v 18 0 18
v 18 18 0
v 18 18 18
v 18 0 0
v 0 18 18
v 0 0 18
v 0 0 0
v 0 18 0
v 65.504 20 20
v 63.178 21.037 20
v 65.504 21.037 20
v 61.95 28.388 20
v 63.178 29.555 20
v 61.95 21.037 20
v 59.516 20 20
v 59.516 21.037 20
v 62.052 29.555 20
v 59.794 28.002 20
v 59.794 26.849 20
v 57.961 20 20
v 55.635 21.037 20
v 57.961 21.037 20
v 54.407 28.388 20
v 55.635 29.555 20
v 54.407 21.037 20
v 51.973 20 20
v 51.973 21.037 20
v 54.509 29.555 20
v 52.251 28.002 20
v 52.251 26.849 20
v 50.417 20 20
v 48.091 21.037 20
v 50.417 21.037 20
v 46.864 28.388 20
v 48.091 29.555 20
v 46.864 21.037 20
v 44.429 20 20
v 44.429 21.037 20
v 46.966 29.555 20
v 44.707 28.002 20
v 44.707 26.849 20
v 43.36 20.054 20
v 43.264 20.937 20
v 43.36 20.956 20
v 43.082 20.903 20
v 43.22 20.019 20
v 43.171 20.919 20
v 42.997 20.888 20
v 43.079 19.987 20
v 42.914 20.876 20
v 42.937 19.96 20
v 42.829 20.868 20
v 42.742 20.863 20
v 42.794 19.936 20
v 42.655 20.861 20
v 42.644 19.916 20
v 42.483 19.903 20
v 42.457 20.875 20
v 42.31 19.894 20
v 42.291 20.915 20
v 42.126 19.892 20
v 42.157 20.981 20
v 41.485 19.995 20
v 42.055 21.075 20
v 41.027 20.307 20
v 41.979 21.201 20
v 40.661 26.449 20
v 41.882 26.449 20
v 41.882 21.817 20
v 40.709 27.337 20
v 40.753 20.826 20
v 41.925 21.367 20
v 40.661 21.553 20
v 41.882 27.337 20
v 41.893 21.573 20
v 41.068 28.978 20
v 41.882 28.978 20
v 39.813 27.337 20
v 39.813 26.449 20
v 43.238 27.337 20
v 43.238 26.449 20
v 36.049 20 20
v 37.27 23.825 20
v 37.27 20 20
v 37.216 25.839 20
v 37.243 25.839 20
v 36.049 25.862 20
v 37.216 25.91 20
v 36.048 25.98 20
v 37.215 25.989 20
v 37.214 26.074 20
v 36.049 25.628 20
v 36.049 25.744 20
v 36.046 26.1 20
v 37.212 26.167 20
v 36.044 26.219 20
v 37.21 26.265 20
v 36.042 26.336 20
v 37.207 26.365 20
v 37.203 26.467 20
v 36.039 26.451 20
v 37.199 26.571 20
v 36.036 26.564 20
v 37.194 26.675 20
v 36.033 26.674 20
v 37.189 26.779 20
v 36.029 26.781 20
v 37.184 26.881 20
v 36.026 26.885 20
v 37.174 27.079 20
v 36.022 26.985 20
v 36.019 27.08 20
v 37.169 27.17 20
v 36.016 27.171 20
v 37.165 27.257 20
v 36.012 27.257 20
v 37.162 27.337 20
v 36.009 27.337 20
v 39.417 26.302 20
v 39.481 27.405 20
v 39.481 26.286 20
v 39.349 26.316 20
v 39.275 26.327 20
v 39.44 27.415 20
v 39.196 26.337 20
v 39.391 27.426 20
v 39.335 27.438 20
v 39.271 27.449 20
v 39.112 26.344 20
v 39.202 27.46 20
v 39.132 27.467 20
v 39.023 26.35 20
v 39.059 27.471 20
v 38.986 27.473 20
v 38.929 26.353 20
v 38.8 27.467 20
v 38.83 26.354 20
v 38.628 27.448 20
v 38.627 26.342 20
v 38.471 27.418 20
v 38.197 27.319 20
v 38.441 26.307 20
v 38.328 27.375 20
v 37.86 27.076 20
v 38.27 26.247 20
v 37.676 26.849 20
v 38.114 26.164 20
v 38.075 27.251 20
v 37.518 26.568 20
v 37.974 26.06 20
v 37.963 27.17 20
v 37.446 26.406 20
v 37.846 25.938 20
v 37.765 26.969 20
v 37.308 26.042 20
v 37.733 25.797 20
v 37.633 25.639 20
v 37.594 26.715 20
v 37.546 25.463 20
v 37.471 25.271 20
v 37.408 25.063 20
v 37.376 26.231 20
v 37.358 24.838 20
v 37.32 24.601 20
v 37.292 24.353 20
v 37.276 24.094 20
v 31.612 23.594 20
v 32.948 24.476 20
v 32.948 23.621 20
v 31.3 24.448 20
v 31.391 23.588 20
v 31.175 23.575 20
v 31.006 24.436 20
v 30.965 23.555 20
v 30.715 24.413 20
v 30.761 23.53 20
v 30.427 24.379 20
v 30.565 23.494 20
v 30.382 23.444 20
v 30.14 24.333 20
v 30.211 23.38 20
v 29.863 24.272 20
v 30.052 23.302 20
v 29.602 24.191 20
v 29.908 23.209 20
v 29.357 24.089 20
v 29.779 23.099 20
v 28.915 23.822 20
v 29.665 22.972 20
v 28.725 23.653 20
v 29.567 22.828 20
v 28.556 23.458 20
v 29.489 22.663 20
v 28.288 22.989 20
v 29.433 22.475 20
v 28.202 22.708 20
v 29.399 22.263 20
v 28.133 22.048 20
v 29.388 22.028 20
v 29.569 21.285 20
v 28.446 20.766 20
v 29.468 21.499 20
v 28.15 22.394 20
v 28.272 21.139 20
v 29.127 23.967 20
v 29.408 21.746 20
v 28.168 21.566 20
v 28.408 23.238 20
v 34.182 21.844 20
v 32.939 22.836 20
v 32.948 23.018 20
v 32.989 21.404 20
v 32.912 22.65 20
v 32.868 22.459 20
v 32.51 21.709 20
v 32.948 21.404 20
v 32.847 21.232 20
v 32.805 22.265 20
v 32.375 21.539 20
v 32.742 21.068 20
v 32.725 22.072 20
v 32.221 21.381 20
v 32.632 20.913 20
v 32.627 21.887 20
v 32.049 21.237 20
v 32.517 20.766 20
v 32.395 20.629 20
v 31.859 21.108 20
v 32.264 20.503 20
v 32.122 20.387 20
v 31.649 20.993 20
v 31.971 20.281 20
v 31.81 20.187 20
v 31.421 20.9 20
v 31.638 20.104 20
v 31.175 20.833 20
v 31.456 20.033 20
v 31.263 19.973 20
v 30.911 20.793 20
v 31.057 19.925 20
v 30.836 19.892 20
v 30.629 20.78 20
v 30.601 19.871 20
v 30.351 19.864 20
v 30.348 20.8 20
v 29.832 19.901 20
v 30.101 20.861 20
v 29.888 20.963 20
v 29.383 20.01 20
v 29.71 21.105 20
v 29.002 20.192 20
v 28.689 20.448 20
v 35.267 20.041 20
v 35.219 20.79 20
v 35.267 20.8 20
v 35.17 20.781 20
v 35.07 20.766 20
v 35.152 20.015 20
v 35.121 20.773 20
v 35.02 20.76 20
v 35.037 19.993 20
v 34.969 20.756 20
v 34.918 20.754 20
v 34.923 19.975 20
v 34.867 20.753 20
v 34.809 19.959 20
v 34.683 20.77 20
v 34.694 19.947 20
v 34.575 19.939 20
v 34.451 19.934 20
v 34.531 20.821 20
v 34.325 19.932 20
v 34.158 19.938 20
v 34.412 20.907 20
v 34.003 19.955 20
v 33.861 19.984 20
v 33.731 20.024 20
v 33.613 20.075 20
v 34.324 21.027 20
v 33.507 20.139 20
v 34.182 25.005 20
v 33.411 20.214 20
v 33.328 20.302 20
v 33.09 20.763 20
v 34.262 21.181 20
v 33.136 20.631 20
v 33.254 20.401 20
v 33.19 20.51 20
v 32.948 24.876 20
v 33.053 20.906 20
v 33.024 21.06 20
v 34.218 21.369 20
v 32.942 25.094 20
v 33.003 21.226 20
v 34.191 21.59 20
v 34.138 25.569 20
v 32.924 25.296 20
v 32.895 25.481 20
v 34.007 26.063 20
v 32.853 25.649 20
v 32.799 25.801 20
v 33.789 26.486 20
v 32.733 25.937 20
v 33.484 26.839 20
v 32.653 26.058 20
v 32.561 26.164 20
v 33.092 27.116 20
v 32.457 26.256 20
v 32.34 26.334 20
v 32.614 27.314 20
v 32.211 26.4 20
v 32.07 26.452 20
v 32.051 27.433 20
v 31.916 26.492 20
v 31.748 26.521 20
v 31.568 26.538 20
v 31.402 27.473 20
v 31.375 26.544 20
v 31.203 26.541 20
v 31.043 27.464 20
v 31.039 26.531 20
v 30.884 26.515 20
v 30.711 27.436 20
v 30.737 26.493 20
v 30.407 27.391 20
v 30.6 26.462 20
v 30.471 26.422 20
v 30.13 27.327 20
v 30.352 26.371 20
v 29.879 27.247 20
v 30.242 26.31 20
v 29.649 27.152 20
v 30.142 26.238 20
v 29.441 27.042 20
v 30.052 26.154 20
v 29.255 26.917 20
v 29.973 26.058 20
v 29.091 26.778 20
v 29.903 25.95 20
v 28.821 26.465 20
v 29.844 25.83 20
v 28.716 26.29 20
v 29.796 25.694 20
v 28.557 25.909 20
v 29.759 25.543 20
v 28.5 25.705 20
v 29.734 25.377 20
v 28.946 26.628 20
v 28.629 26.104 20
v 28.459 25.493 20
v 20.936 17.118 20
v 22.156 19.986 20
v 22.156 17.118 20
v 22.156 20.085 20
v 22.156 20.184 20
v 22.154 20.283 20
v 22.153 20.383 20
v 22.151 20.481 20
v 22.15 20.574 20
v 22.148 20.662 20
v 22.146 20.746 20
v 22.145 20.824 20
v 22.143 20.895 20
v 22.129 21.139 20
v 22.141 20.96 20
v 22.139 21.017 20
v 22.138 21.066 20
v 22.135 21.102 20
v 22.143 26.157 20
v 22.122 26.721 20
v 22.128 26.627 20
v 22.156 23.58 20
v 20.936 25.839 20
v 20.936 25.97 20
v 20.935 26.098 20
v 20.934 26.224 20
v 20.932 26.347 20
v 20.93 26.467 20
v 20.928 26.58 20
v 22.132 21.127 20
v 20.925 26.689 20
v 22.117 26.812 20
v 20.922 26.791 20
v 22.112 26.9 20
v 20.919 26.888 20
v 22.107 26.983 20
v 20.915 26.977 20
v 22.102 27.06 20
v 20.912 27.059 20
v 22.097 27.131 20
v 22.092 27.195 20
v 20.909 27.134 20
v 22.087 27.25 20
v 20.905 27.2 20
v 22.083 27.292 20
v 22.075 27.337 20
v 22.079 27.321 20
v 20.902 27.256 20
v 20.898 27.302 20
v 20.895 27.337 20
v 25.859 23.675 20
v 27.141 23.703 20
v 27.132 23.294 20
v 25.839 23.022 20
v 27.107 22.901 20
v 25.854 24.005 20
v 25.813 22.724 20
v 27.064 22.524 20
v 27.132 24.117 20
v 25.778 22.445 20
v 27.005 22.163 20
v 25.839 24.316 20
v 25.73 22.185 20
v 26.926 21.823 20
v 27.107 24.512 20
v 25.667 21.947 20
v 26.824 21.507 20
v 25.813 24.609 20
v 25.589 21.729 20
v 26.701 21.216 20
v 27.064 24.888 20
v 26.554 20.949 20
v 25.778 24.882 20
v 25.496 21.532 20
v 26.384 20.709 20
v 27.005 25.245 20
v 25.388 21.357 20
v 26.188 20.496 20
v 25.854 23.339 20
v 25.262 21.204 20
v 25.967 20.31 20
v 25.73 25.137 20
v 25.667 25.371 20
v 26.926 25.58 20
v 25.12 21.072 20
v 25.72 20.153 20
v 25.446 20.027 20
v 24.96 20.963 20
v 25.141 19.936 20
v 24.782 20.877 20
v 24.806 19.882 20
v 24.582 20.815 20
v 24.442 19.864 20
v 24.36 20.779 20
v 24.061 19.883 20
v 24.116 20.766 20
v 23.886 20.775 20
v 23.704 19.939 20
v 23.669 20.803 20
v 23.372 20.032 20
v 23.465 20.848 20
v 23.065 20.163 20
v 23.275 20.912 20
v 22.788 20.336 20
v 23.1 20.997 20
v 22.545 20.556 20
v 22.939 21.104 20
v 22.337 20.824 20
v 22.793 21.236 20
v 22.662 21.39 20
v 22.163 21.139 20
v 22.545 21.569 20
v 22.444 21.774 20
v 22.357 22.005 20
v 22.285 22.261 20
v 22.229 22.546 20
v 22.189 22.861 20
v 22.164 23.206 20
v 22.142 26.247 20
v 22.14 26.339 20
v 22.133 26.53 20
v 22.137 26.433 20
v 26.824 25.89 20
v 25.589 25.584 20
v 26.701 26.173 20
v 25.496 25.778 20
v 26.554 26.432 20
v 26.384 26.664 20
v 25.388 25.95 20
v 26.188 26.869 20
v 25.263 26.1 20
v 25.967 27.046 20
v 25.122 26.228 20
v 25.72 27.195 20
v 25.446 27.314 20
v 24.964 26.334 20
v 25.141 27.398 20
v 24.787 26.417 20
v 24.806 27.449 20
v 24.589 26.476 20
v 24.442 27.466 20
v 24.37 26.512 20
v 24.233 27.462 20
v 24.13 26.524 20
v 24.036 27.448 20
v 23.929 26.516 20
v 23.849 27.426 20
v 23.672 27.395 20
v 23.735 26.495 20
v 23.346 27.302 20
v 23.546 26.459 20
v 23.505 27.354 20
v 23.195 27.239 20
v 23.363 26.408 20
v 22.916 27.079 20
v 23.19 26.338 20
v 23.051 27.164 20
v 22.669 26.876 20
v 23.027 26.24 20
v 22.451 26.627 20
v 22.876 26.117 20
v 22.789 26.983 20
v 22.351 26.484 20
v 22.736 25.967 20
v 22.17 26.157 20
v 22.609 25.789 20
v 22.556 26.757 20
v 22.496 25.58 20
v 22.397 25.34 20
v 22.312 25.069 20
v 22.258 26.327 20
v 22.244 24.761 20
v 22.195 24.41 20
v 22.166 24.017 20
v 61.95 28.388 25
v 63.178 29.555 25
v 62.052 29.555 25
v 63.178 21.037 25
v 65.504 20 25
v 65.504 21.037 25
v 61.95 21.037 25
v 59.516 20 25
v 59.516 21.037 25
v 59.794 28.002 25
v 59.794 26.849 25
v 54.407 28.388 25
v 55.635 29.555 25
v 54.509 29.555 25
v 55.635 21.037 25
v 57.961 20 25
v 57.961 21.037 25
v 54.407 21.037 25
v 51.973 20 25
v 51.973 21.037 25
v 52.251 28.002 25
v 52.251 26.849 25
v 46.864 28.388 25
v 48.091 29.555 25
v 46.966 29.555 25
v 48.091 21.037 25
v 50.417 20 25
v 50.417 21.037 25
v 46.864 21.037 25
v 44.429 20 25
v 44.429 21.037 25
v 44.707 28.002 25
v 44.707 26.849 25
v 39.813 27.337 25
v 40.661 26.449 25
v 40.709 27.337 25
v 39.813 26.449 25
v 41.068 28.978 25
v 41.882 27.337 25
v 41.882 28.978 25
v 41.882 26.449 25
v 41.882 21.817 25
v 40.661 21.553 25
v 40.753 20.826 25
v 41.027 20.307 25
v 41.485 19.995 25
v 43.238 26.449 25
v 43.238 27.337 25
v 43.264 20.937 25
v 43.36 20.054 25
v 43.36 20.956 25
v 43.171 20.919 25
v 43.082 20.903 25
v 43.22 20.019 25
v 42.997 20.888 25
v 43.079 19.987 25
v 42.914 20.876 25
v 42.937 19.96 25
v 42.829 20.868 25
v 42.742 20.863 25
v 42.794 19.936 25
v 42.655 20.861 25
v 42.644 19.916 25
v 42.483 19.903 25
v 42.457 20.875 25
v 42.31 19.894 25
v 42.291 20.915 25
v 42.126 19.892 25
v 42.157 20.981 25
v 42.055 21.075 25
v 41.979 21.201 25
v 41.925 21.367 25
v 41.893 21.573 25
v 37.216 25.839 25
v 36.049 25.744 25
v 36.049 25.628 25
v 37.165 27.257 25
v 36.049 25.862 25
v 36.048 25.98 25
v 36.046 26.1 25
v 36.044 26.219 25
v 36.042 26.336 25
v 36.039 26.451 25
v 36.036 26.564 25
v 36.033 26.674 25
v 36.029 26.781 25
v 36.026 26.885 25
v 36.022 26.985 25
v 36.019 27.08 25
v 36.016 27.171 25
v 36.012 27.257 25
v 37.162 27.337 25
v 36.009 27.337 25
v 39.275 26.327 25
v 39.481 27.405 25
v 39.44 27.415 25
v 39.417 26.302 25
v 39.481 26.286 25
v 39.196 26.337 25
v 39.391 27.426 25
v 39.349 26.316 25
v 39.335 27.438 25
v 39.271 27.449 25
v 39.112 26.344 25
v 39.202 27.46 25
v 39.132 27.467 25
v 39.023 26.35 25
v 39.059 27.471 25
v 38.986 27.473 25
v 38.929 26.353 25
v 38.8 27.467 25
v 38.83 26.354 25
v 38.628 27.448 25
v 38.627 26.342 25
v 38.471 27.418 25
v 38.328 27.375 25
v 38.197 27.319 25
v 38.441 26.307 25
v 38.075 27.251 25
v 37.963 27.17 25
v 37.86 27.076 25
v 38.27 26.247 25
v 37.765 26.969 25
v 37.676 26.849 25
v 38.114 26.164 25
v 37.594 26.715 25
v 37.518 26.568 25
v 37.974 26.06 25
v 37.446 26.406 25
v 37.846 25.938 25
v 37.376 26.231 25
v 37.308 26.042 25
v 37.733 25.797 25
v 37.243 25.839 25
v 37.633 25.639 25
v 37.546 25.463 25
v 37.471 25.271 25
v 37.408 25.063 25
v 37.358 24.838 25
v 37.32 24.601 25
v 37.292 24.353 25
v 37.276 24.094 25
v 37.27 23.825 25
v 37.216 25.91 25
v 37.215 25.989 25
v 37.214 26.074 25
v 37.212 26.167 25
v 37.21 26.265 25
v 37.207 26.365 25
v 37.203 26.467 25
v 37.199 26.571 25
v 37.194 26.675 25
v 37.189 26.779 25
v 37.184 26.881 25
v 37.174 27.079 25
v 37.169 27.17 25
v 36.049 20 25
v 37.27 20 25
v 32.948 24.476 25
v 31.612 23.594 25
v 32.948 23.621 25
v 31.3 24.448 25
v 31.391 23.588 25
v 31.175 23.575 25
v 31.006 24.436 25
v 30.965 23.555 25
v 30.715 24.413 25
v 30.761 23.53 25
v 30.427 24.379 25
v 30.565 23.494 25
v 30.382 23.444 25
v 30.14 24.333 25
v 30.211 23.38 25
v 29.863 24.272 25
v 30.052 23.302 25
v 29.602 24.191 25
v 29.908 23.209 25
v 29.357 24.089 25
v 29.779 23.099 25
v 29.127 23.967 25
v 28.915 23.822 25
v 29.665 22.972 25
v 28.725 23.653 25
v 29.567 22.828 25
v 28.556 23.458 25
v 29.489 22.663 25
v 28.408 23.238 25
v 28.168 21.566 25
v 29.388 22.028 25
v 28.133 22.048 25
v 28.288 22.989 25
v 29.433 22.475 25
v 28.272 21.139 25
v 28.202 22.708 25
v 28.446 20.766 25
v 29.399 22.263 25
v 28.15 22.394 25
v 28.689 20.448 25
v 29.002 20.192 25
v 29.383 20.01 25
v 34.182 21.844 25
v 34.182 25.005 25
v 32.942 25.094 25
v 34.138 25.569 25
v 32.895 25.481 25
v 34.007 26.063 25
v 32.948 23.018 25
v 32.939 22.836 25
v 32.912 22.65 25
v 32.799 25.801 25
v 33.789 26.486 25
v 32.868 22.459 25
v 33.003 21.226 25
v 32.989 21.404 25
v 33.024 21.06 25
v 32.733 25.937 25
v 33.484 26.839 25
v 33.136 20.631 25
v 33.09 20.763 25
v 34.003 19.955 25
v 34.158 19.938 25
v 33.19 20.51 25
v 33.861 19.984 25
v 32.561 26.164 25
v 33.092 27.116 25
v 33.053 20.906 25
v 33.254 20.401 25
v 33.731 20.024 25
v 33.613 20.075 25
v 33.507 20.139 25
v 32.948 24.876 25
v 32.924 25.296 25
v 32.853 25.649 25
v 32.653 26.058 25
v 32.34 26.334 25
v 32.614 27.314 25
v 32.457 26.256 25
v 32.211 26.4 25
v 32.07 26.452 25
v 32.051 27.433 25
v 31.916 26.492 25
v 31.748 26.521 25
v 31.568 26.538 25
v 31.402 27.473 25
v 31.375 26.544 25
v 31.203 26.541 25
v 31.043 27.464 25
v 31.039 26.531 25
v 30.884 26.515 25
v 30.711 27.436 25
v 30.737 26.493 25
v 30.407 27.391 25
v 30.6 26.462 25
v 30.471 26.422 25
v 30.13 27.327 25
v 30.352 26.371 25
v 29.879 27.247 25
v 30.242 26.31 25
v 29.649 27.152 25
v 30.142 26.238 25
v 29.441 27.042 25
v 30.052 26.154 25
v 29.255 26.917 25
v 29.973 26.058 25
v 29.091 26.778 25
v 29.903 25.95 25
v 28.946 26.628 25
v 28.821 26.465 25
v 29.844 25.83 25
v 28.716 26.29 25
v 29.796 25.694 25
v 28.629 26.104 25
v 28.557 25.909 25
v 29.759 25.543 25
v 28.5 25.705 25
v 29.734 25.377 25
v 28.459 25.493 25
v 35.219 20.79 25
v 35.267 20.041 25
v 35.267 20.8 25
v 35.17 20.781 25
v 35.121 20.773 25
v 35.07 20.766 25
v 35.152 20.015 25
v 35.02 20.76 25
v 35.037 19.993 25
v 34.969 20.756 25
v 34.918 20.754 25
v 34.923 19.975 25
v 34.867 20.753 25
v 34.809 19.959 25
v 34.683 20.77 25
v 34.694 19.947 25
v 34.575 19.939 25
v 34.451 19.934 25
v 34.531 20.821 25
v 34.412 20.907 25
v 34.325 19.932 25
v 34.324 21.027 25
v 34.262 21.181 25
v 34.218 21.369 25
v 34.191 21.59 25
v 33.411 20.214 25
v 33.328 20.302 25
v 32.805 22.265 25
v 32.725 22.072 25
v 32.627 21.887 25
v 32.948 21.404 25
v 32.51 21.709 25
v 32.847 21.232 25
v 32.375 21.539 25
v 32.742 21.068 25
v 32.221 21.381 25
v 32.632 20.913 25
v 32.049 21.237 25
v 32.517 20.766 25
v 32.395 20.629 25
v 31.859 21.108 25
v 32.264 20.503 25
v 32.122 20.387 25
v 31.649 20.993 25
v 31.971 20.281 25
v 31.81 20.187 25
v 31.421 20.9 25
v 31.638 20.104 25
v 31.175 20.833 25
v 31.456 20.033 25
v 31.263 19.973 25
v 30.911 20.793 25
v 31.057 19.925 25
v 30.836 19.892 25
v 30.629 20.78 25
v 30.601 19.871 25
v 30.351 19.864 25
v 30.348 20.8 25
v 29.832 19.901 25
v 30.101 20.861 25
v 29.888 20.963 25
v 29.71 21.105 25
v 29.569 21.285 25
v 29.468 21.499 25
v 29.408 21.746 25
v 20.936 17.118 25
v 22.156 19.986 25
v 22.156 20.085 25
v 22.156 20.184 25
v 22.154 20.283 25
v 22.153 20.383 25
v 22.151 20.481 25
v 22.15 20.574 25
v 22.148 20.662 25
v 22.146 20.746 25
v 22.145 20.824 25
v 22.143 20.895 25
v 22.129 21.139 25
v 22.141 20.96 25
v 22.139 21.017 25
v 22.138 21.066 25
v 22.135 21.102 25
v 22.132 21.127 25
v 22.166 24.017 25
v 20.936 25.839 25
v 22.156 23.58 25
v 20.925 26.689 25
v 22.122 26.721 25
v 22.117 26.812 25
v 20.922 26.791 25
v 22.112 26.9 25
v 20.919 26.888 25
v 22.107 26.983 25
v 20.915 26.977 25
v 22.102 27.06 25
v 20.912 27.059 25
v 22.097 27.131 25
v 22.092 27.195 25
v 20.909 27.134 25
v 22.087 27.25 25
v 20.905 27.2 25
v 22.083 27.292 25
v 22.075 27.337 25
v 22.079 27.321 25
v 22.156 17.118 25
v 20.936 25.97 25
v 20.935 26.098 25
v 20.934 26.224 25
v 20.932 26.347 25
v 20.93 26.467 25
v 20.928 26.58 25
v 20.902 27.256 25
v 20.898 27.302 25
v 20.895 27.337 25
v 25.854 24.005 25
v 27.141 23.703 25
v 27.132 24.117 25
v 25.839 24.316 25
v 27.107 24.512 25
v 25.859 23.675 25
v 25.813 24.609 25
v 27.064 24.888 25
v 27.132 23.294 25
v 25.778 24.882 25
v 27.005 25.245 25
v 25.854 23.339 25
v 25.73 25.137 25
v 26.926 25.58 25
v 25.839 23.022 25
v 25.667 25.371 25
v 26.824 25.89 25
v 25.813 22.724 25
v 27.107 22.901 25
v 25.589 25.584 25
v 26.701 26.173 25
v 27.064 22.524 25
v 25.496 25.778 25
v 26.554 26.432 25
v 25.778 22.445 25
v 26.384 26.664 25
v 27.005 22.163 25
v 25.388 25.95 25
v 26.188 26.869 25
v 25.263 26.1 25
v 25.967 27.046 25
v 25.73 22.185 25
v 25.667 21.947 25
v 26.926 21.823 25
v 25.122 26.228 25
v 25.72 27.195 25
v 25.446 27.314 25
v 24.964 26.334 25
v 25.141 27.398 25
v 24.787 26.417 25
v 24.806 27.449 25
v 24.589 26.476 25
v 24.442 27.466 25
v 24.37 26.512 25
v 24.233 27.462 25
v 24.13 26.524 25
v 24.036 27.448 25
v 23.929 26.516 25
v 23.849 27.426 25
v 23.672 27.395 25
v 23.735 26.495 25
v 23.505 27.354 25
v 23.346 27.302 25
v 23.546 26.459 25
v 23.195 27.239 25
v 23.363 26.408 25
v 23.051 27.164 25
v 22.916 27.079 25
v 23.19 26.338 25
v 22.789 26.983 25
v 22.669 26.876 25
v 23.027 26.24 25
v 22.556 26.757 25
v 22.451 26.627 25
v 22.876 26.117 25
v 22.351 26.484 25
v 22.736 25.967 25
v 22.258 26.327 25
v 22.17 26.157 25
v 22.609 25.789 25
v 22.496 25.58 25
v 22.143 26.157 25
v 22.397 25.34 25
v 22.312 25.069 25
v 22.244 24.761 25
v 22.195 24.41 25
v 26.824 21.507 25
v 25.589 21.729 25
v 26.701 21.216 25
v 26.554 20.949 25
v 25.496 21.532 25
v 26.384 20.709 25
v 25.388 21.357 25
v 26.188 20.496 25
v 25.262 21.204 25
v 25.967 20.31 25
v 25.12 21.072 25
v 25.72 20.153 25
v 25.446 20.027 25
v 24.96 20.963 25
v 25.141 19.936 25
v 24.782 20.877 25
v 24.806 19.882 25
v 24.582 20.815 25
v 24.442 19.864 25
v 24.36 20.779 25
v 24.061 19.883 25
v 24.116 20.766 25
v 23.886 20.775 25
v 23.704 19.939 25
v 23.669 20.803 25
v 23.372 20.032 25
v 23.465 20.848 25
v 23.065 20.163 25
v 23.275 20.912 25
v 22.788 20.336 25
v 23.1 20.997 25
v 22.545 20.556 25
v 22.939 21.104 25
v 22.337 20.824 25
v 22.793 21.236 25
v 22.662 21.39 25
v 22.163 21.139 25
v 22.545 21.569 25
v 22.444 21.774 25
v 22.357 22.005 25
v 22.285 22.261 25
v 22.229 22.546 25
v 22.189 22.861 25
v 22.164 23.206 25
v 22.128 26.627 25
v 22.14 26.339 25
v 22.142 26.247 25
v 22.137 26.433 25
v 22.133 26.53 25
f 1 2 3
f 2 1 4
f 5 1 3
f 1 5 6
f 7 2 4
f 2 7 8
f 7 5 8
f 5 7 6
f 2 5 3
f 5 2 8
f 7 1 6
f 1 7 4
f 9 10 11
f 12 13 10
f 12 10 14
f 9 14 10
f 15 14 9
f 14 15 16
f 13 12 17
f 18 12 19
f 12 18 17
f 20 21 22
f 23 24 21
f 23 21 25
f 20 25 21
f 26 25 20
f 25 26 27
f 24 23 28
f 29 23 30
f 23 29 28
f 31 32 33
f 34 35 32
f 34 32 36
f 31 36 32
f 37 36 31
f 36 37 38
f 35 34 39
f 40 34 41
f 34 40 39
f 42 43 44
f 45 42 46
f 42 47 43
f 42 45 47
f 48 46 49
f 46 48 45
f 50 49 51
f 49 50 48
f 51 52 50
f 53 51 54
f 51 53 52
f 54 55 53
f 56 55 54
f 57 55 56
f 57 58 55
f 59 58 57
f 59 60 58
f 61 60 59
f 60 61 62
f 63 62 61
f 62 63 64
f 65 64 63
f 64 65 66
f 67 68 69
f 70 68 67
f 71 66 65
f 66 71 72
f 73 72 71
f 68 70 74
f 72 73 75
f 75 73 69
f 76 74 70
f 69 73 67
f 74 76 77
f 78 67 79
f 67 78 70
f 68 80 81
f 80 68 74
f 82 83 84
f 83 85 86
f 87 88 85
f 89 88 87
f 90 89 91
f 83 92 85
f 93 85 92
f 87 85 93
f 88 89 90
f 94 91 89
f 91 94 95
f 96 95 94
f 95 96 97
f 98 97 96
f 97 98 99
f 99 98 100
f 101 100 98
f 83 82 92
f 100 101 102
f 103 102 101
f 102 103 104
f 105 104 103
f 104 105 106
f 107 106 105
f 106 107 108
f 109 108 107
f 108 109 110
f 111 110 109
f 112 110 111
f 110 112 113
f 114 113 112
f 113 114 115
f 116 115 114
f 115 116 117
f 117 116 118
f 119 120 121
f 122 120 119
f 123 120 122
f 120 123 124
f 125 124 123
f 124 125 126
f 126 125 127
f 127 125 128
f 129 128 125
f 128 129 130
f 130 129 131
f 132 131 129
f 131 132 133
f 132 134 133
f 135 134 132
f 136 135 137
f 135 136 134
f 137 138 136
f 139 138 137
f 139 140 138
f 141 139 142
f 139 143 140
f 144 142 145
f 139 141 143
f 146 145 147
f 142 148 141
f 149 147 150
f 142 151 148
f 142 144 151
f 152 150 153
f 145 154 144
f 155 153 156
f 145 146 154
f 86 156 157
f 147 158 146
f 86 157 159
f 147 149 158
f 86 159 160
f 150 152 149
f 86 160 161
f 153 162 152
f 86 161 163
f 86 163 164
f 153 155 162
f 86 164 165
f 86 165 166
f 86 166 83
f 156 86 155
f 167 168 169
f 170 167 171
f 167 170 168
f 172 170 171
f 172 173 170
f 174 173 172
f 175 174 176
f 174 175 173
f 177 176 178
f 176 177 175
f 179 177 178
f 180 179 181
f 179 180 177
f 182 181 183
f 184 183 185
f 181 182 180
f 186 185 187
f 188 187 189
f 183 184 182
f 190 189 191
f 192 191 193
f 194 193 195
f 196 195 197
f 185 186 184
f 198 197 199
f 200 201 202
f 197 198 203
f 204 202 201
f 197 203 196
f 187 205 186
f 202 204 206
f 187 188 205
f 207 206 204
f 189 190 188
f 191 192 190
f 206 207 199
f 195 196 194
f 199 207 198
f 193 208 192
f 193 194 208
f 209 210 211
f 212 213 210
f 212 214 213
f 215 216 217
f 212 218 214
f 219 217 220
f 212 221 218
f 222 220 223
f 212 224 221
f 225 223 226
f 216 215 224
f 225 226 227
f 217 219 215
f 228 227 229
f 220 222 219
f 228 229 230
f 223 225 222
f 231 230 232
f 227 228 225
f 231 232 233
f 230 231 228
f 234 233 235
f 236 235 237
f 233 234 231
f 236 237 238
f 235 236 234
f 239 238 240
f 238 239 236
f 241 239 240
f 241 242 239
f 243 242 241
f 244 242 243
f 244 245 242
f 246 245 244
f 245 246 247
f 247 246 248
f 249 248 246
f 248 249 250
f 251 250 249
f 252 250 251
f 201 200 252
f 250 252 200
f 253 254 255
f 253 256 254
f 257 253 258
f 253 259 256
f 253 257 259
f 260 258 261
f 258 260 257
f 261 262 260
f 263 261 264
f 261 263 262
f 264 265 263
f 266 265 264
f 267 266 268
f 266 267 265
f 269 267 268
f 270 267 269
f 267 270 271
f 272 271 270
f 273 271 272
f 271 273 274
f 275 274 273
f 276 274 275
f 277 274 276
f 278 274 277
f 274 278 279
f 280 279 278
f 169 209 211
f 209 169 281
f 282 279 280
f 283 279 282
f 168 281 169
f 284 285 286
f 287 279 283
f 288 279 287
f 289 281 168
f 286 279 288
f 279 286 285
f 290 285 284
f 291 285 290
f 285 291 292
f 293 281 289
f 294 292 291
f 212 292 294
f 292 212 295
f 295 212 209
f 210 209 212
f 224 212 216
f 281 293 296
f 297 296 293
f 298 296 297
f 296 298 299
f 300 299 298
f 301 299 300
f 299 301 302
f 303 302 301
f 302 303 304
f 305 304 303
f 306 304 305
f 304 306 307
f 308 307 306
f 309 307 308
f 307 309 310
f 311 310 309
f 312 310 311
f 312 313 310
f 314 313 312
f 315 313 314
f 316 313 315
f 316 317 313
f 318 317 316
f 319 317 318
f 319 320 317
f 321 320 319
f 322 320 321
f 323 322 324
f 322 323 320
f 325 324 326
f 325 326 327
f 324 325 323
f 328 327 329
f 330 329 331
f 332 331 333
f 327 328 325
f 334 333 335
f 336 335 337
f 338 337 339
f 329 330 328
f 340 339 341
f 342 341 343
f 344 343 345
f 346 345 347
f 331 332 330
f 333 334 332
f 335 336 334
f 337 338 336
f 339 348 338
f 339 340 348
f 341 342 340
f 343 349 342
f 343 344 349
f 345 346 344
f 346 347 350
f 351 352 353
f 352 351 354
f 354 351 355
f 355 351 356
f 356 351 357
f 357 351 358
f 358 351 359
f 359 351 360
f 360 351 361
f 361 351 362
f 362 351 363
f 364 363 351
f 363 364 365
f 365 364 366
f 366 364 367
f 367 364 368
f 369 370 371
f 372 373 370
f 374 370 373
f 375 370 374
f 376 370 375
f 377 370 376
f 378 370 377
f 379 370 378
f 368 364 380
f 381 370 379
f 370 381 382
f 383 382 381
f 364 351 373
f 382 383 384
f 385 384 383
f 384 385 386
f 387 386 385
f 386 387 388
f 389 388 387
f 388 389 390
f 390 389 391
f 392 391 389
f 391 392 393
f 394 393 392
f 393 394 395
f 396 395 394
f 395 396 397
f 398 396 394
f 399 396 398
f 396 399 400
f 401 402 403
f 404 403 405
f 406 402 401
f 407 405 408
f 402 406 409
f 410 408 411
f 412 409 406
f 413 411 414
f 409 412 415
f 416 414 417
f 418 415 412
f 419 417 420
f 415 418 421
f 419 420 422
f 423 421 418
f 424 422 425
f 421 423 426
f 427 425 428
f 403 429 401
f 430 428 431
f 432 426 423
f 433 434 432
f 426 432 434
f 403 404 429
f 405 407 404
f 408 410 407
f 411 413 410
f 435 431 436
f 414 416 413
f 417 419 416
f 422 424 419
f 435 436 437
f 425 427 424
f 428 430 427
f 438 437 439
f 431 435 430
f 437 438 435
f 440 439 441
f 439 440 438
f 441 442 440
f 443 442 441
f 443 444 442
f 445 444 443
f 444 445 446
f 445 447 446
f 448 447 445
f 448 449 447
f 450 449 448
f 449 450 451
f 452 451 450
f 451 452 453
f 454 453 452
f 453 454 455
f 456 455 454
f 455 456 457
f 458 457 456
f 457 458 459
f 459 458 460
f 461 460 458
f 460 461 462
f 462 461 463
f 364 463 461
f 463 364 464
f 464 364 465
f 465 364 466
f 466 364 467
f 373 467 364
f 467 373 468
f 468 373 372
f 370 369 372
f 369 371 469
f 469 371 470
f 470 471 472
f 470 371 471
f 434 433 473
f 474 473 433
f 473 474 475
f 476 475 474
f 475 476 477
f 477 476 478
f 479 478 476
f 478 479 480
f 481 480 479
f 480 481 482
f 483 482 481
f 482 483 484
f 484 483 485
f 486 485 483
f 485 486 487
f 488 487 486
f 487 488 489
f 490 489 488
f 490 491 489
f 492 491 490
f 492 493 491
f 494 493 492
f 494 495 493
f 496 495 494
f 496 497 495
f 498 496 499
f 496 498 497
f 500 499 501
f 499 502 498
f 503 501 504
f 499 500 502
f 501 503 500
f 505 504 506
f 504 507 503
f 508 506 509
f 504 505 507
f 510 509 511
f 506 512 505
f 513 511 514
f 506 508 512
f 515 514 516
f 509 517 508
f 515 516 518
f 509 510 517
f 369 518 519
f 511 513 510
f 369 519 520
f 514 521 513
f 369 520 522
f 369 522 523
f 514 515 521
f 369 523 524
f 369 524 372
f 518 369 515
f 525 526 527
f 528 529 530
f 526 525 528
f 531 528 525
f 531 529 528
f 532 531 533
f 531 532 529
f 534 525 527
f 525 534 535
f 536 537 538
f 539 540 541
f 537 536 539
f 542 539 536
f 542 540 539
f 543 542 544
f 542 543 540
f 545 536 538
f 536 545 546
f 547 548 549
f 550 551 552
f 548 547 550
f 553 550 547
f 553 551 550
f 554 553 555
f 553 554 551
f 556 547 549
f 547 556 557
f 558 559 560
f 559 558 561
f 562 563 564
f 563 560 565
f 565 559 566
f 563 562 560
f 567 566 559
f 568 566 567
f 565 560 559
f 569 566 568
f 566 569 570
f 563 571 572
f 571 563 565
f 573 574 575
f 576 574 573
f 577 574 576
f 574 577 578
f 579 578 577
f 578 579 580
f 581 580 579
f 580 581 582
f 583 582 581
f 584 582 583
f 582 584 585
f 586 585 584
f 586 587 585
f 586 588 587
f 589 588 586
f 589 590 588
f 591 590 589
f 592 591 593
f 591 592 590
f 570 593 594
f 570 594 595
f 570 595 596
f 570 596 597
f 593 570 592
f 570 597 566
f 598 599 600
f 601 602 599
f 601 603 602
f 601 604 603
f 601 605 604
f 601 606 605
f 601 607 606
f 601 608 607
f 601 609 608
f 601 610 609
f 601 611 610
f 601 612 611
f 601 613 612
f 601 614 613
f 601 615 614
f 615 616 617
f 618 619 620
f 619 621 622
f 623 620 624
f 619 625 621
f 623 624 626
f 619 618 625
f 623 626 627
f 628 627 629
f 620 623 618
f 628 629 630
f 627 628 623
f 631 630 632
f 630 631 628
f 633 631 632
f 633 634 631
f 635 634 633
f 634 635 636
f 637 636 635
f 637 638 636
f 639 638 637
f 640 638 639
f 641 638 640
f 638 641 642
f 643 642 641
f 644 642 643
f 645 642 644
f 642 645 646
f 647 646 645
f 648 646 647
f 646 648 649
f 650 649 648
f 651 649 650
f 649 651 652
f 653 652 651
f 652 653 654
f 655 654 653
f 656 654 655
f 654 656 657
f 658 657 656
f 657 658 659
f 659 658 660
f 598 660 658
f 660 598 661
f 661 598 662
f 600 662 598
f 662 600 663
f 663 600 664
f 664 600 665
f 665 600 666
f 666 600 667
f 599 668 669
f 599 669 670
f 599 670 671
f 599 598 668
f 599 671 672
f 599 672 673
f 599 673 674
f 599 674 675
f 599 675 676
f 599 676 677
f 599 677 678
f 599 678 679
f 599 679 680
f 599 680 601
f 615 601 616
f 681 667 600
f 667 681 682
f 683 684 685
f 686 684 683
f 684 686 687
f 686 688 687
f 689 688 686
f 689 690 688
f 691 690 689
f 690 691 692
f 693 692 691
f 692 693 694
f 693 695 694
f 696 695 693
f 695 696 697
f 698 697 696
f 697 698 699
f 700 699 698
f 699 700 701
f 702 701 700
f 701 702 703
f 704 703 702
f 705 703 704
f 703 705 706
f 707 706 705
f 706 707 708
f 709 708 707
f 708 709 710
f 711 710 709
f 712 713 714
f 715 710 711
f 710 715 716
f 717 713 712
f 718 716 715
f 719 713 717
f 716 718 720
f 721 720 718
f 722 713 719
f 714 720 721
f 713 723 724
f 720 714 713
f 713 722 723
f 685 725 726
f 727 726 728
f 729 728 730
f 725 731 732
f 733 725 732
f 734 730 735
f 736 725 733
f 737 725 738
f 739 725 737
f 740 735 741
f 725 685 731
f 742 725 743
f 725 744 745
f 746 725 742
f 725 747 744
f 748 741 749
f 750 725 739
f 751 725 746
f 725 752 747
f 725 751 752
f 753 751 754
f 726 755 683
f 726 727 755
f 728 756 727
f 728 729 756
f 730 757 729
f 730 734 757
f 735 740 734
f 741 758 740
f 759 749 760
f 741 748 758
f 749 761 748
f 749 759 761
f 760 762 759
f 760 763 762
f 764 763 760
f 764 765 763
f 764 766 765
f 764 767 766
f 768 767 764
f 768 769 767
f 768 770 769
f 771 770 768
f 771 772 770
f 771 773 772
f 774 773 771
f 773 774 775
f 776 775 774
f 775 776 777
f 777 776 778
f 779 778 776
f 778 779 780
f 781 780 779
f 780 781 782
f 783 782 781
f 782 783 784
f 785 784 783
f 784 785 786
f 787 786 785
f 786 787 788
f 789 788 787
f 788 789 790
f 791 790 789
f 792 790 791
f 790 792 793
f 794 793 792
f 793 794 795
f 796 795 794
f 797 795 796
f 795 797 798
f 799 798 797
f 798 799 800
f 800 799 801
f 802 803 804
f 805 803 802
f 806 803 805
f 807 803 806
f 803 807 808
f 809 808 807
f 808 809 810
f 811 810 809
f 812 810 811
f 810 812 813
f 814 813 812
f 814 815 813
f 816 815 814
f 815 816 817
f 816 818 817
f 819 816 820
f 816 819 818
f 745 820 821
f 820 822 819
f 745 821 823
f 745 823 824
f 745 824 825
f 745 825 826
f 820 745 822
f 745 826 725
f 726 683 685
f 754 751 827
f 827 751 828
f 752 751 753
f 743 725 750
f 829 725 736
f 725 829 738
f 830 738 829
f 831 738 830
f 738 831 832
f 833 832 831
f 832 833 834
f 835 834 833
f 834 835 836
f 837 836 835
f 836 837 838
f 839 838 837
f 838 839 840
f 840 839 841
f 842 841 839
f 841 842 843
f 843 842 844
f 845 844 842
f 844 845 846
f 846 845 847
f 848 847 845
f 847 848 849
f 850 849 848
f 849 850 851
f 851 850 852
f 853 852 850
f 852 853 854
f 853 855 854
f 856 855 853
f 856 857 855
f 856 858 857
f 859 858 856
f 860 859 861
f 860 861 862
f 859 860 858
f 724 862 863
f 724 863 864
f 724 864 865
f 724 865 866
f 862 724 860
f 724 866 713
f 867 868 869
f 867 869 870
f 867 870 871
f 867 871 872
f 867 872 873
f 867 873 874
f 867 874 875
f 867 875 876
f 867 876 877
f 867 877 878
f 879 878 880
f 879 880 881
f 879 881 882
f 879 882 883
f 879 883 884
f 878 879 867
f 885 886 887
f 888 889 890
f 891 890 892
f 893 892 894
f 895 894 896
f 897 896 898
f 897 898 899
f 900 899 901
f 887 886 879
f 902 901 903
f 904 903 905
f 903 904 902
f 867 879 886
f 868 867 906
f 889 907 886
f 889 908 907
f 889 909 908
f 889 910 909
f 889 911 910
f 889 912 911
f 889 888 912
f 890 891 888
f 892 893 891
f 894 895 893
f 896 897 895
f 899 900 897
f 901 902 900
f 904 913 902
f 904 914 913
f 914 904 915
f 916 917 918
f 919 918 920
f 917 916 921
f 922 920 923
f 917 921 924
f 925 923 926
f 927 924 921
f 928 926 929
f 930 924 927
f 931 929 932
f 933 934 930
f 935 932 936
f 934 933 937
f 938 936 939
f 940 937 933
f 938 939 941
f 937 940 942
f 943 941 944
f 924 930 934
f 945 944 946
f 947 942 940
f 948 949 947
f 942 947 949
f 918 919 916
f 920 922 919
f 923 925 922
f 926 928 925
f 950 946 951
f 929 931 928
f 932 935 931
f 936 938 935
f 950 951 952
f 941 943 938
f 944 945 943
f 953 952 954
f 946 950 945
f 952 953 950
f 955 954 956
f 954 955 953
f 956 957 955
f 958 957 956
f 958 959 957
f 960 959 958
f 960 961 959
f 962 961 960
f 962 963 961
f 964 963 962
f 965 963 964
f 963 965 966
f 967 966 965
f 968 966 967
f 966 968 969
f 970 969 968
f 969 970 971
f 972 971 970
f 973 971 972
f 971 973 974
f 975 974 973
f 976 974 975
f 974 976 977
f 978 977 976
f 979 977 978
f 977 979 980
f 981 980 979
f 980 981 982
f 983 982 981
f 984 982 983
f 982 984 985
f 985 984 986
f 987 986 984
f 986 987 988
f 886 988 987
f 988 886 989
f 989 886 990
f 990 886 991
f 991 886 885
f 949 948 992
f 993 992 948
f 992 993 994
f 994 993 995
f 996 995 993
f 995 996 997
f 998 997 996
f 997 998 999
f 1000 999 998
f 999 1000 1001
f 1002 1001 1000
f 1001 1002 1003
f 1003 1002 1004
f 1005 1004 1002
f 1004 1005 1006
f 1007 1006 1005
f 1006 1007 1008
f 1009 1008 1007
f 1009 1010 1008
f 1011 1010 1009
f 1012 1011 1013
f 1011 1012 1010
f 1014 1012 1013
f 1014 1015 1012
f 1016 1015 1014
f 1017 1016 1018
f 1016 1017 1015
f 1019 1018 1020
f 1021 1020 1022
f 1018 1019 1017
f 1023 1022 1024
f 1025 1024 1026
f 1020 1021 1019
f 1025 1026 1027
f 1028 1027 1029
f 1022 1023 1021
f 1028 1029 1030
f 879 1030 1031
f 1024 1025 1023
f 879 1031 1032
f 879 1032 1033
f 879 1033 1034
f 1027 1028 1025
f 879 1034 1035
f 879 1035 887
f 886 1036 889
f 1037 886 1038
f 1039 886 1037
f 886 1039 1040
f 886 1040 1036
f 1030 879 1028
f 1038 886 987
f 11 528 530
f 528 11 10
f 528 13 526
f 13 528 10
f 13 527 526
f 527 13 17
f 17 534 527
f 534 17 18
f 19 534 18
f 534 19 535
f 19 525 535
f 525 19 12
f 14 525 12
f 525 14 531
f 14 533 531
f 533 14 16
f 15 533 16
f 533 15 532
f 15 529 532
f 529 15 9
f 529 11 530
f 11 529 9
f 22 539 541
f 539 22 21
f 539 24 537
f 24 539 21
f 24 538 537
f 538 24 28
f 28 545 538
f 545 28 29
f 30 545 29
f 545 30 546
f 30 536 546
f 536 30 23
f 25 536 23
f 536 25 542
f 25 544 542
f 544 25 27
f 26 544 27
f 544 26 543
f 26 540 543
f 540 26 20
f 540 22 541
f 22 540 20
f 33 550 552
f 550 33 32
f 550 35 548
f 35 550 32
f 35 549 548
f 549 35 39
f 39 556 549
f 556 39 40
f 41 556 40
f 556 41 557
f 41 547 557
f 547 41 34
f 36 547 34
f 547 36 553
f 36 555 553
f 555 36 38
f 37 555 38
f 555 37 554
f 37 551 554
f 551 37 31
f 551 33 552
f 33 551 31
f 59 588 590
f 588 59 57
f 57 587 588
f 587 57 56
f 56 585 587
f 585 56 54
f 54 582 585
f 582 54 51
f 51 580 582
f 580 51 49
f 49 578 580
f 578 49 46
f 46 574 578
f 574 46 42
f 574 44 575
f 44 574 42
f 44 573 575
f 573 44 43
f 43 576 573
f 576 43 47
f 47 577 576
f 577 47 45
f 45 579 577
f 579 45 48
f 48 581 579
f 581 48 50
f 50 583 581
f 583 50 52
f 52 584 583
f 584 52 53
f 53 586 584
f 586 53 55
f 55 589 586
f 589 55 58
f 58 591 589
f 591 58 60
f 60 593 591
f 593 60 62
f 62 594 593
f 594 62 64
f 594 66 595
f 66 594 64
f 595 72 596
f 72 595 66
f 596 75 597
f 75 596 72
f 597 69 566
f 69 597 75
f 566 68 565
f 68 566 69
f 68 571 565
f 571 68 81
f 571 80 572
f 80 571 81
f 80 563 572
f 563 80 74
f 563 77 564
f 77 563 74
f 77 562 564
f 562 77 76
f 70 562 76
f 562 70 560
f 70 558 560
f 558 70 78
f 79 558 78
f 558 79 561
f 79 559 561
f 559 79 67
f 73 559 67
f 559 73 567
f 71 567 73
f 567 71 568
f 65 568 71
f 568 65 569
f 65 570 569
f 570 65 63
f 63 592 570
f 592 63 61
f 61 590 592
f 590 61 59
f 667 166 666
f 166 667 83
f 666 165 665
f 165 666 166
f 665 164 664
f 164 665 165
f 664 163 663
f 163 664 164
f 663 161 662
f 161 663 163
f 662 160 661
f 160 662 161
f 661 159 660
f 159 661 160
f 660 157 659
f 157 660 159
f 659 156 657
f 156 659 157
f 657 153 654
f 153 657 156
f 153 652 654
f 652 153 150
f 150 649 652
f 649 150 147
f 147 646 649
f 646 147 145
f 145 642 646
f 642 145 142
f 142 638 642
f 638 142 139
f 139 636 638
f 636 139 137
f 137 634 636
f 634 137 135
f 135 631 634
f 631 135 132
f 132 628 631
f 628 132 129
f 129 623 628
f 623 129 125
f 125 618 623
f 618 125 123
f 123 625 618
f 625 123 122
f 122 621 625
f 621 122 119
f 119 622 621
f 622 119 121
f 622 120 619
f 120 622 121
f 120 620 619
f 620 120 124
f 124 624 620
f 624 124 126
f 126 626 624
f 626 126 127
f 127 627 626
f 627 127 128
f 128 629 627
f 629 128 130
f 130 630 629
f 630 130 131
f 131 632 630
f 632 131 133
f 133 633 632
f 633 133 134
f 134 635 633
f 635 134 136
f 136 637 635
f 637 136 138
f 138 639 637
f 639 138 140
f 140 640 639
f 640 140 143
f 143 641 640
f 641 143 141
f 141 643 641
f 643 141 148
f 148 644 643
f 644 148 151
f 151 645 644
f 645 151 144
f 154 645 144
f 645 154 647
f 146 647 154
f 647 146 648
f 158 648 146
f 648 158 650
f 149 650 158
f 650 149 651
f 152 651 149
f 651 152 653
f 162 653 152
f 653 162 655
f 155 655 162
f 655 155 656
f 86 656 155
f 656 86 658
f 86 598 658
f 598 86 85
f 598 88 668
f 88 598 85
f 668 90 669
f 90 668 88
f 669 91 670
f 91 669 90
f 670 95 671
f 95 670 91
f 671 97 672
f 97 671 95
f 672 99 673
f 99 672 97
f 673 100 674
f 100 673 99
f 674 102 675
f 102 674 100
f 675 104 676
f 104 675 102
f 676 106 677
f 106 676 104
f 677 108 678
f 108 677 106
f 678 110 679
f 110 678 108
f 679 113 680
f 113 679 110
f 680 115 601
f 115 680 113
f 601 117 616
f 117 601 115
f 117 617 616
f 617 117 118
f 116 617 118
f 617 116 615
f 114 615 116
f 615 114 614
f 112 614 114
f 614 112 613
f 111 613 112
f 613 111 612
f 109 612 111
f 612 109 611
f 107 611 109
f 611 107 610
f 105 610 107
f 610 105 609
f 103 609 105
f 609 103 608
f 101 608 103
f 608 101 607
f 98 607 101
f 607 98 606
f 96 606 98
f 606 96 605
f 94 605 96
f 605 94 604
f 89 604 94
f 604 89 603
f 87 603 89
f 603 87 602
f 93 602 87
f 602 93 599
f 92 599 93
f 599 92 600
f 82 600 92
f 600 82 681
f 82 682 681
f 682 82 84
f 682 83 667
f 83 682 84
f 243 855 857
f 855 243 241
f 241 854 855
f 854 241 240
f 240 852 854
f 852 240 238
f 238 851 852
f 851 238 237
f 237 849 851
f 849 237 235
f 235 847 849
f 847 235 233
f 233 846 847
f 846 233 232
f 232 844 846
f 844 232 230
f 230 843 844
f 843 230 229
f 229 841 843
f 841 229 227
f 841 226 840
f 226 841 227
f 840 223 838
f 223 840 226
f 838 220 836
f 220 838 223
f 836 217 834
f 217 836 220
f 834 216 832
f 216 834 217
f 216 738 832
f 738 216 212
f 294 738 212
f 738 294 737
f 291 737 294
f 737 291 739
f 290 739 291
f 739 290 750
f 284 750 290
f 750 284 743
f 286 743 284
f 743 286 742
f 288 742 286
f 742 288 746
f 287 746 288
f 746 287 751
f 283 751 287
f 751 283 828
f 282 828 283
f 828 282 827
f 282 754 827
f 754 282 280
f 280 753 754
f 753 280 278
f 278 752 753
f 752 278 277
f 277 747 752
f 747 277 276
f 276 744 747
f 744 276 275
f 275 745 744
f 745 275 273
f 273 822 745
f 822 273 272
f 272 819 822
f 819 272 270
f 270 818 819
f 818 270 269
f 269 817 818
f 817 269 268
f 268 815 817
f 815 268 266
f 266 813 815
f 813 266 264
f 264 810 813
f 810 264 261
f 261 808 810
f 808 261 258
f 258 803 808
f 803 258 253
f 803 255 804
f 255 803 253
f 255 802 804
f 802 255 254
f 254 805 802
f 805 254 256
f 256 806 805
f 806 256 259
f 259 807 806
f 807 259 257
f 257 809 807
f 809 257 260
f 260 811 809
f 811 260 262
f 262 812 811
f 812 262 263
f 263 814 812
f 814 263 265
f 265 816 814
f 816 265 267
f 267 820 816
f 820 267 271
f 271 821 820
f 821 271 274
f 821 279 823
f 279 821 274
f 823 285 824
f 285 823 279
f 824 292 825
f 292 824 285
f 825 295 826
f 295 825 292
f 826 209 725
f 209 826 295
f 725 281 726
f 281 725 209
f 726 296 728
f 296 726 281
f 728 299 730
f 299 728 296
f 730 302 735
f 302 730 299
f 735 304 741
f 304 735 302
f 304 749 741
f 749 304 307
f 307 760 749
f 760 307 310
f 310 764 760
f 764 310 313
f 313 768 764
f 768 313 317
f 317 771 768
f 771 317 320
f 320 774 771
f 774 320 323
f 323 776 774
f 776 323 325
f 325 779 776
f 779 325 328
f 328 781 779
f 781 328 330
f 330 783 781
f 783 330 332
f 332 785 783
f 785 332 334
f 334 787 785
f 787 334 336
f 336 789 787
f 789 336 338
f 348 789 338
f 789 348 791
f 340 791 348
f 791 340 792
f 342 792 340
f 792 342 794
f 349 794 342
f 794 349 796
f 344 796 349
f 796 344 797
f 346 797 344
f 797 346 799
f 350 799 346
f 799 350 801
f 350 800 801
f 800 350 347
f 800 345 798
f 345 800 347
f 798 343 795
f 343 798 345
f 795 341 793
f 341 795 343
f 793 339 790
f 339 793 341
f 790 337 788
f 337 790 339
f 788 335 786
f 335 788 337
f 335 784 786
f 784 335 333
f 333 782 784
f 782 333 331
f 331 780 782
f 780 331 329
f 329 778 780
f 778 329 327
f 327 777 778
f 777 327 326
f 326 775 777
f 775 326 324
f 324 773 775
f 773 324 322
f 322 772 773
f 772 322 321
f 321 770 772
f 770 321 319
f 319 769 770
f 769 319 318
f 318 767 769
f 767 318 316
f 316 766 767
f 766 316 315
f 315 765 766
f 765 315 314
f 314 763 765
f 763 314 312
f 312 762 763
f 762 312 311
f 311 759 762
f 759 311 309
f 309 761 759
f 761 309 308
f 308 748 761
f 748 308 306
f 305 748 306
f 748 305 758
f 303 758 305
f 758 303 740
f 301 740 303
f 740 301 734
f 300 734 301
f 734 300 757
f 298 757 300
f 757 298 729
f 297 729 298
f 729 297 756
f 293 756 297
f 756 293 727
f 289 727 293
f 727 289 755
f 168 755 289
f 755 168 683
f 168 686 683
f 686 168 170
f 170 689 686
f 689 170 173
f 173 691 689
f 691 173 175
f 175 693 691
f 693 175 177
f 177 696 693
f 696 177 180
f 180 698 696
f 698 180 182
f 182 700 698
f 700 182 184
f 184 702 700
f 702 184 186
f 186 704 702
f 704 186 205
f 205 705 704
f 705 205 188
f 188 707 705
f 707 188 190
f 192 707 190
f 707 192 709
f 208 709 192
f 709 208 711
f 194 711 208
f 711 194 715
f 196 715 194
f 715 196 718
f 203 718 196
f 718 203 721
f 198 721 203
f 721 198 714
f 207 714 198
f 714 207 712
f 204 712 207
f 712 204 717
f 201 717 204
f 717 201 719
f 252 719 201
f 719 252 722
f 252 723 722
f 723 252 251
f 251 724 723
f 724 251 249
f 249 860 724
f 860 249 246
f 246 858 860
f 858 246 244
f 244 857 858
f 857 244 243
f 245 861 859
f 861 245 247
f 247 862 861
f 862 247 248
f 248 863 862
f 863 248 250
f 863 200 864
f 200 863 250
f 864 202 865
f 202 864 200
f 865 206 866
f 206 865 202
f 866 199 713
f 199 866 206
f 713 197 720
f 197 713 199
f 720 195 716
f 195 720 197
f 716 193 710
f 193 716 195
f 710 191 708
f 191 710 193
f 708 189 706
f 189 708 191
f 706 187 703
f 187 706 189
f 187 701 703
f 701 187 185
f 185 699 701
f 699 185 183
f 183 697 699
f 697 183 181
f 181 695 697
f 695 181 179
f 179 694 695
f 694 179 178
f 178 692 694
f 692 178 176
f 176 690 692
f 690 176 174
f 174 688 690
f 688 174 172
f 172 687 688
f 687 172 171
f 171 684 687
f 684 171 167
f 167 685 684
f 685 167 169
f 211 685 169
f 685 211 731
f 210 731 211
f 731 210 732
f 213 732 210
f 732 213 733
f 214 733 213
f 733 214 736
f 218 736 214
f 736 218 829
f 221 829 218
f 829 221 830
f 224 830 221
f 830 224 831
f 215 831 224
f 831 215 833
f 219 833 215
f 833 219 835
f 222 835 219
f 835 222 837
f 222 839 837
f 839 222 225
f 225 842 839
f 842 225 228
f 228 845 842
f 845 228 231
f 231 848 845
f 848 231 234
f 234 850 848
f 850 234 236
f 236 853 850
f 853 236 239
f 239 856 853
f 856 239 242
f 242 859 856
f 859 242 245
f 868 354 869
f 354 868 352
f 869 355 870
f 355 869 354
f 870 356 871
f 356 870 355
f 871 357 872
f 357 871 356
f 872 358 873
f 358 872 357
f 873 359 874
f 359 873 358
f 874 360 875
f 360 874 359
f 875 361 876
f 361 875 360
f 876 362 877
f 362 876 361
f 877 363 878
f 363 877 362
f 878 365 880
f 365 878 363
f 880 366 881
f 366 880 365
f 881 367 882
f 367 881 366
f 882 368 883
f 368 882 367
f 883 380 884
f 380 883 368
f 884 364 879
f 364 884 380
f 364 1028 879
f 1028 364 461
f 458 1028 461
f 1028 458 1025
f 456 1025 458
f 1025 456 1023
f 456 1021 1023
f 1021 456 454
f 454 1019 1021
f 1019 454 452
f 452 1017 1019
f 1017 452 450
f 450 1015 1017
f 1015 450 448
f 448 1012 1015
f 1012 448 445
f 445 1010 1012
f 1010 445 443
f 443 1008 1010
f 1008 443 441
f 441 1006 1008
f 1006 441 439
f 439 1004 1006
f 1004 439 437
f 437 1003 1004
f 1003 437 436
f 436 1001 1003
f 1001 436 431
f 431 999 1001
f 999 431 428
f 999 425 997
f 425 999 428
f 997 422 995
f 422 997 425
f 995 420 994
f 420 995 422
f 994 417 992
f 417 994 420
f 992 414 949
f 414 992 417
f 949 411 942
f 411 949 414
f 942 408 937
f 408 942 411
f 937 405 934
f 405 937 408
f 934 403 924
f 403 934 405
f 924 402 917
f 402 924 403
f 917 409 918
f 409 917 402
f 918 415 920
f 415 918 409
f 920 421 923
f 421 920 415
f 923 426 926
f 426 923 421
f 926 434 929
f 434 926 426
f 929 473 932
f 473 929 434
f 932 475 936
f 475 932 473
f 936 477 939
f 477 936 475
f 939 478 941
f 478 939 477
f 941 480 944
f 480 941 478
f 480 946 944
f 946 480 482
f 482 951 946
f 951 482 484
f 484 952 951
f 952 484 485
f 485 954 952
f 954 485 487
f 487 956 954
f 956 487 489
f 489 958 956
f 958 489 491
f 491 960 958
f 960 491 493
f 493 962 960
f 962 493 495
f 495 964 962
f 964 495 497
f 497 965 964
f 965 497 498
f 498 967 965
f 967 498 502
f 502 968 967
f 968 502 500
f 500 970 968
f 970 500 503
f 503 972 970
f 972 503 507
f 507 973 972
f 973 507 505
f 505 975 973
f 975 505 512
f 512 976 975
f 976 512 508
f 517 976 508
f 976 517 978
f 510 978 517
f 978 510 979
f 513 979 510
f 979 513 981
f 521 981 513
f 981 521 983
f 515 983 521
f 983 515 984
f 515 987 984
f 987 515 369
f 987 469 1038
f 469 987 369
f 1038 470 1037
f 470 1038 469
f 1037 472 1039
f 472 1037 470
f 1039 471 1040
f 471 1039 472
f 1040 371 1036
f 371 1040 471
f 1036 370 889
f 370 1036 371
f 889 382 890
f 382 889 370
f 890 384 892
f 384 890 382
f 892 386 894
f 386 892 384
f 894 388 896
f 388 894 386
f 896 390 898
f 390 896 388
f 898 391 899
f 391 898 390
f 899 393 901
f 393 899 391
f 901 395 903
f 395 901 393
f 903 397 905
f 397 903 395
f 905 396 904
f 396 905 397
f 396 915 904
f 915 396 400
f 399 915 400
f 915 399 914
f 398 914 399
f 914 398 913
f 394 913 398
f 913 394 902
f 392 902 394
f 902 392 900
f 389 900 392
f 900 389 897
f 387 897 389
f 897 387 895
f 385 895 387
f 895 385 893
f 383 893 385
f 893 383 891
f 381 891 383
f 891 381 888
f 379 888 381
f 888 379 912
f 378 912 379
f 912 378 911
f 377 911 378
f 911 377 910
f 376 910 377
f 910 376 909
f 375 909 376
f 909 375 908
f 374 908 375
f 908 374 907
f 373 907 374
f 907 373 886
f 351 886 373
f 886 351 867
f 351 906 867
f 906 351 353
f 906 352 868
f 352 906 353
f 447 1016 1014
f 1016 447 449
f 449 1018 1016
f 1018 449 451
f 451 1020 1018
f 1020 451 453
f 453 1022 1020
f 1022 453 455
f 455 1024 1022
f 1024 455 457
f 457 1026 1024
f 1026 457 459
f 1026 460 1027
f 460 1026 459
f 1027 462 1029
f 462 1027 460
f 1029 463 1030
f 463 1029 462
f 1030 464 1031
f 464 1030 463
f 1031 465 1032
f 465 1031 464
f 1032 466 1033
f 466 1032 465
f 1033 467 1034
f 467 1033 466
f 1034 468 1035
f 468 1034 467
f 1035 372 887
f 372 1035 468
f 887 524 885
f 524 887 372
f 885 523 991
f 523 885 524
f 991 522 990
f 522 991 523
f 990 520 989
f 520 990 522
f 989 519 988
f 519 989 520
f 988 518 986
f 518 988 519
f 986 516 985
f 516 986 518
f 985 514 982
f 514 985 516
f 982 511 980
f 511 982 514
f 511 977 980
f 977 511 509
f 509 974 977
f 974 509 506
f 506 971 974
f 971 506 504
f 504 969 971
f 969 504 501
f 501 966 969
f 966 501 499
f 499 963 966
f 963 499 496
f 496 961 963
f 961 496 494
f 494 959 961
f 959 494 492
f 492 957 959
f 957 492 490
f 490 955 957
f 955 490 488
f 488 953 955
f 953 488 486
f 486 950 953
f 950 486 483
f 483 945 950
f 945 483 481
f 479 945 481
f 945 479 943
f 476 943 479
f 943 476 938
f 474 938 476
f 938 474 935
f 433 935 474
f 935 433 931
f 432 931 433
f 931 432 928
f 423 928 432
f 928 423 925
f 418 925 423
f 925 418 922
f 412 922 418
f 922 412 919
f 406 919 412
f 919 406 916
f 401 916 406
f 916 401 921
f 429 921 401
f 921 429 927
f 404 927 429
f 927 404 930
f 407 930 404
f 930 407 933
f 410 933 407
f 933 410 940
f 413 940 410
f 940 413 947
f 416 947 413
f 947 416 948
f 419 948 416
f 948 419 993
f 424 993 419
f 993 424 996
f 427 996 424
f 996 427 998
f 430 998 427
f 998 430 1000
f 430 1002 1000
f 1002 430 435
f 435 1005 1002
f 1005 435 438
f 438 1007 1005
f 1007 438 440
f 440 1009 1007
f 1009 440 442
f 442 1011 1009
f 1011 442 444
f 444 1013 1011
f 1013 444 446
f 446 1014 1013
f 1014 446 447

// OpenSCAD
//[CUSTOMIZATION]
// X Dimension
xdim=18;
// Y Dimension
ydim=17;
// Z Dimension
zdim=19;
// Message
txt="part111";
module __END_CUSTOMIZATIONS () {}
cube(xdim,ydim,zdim);
translate([20,20,20]) { linear_extrude(5) text(txt, font="Liberation Sans"); }
